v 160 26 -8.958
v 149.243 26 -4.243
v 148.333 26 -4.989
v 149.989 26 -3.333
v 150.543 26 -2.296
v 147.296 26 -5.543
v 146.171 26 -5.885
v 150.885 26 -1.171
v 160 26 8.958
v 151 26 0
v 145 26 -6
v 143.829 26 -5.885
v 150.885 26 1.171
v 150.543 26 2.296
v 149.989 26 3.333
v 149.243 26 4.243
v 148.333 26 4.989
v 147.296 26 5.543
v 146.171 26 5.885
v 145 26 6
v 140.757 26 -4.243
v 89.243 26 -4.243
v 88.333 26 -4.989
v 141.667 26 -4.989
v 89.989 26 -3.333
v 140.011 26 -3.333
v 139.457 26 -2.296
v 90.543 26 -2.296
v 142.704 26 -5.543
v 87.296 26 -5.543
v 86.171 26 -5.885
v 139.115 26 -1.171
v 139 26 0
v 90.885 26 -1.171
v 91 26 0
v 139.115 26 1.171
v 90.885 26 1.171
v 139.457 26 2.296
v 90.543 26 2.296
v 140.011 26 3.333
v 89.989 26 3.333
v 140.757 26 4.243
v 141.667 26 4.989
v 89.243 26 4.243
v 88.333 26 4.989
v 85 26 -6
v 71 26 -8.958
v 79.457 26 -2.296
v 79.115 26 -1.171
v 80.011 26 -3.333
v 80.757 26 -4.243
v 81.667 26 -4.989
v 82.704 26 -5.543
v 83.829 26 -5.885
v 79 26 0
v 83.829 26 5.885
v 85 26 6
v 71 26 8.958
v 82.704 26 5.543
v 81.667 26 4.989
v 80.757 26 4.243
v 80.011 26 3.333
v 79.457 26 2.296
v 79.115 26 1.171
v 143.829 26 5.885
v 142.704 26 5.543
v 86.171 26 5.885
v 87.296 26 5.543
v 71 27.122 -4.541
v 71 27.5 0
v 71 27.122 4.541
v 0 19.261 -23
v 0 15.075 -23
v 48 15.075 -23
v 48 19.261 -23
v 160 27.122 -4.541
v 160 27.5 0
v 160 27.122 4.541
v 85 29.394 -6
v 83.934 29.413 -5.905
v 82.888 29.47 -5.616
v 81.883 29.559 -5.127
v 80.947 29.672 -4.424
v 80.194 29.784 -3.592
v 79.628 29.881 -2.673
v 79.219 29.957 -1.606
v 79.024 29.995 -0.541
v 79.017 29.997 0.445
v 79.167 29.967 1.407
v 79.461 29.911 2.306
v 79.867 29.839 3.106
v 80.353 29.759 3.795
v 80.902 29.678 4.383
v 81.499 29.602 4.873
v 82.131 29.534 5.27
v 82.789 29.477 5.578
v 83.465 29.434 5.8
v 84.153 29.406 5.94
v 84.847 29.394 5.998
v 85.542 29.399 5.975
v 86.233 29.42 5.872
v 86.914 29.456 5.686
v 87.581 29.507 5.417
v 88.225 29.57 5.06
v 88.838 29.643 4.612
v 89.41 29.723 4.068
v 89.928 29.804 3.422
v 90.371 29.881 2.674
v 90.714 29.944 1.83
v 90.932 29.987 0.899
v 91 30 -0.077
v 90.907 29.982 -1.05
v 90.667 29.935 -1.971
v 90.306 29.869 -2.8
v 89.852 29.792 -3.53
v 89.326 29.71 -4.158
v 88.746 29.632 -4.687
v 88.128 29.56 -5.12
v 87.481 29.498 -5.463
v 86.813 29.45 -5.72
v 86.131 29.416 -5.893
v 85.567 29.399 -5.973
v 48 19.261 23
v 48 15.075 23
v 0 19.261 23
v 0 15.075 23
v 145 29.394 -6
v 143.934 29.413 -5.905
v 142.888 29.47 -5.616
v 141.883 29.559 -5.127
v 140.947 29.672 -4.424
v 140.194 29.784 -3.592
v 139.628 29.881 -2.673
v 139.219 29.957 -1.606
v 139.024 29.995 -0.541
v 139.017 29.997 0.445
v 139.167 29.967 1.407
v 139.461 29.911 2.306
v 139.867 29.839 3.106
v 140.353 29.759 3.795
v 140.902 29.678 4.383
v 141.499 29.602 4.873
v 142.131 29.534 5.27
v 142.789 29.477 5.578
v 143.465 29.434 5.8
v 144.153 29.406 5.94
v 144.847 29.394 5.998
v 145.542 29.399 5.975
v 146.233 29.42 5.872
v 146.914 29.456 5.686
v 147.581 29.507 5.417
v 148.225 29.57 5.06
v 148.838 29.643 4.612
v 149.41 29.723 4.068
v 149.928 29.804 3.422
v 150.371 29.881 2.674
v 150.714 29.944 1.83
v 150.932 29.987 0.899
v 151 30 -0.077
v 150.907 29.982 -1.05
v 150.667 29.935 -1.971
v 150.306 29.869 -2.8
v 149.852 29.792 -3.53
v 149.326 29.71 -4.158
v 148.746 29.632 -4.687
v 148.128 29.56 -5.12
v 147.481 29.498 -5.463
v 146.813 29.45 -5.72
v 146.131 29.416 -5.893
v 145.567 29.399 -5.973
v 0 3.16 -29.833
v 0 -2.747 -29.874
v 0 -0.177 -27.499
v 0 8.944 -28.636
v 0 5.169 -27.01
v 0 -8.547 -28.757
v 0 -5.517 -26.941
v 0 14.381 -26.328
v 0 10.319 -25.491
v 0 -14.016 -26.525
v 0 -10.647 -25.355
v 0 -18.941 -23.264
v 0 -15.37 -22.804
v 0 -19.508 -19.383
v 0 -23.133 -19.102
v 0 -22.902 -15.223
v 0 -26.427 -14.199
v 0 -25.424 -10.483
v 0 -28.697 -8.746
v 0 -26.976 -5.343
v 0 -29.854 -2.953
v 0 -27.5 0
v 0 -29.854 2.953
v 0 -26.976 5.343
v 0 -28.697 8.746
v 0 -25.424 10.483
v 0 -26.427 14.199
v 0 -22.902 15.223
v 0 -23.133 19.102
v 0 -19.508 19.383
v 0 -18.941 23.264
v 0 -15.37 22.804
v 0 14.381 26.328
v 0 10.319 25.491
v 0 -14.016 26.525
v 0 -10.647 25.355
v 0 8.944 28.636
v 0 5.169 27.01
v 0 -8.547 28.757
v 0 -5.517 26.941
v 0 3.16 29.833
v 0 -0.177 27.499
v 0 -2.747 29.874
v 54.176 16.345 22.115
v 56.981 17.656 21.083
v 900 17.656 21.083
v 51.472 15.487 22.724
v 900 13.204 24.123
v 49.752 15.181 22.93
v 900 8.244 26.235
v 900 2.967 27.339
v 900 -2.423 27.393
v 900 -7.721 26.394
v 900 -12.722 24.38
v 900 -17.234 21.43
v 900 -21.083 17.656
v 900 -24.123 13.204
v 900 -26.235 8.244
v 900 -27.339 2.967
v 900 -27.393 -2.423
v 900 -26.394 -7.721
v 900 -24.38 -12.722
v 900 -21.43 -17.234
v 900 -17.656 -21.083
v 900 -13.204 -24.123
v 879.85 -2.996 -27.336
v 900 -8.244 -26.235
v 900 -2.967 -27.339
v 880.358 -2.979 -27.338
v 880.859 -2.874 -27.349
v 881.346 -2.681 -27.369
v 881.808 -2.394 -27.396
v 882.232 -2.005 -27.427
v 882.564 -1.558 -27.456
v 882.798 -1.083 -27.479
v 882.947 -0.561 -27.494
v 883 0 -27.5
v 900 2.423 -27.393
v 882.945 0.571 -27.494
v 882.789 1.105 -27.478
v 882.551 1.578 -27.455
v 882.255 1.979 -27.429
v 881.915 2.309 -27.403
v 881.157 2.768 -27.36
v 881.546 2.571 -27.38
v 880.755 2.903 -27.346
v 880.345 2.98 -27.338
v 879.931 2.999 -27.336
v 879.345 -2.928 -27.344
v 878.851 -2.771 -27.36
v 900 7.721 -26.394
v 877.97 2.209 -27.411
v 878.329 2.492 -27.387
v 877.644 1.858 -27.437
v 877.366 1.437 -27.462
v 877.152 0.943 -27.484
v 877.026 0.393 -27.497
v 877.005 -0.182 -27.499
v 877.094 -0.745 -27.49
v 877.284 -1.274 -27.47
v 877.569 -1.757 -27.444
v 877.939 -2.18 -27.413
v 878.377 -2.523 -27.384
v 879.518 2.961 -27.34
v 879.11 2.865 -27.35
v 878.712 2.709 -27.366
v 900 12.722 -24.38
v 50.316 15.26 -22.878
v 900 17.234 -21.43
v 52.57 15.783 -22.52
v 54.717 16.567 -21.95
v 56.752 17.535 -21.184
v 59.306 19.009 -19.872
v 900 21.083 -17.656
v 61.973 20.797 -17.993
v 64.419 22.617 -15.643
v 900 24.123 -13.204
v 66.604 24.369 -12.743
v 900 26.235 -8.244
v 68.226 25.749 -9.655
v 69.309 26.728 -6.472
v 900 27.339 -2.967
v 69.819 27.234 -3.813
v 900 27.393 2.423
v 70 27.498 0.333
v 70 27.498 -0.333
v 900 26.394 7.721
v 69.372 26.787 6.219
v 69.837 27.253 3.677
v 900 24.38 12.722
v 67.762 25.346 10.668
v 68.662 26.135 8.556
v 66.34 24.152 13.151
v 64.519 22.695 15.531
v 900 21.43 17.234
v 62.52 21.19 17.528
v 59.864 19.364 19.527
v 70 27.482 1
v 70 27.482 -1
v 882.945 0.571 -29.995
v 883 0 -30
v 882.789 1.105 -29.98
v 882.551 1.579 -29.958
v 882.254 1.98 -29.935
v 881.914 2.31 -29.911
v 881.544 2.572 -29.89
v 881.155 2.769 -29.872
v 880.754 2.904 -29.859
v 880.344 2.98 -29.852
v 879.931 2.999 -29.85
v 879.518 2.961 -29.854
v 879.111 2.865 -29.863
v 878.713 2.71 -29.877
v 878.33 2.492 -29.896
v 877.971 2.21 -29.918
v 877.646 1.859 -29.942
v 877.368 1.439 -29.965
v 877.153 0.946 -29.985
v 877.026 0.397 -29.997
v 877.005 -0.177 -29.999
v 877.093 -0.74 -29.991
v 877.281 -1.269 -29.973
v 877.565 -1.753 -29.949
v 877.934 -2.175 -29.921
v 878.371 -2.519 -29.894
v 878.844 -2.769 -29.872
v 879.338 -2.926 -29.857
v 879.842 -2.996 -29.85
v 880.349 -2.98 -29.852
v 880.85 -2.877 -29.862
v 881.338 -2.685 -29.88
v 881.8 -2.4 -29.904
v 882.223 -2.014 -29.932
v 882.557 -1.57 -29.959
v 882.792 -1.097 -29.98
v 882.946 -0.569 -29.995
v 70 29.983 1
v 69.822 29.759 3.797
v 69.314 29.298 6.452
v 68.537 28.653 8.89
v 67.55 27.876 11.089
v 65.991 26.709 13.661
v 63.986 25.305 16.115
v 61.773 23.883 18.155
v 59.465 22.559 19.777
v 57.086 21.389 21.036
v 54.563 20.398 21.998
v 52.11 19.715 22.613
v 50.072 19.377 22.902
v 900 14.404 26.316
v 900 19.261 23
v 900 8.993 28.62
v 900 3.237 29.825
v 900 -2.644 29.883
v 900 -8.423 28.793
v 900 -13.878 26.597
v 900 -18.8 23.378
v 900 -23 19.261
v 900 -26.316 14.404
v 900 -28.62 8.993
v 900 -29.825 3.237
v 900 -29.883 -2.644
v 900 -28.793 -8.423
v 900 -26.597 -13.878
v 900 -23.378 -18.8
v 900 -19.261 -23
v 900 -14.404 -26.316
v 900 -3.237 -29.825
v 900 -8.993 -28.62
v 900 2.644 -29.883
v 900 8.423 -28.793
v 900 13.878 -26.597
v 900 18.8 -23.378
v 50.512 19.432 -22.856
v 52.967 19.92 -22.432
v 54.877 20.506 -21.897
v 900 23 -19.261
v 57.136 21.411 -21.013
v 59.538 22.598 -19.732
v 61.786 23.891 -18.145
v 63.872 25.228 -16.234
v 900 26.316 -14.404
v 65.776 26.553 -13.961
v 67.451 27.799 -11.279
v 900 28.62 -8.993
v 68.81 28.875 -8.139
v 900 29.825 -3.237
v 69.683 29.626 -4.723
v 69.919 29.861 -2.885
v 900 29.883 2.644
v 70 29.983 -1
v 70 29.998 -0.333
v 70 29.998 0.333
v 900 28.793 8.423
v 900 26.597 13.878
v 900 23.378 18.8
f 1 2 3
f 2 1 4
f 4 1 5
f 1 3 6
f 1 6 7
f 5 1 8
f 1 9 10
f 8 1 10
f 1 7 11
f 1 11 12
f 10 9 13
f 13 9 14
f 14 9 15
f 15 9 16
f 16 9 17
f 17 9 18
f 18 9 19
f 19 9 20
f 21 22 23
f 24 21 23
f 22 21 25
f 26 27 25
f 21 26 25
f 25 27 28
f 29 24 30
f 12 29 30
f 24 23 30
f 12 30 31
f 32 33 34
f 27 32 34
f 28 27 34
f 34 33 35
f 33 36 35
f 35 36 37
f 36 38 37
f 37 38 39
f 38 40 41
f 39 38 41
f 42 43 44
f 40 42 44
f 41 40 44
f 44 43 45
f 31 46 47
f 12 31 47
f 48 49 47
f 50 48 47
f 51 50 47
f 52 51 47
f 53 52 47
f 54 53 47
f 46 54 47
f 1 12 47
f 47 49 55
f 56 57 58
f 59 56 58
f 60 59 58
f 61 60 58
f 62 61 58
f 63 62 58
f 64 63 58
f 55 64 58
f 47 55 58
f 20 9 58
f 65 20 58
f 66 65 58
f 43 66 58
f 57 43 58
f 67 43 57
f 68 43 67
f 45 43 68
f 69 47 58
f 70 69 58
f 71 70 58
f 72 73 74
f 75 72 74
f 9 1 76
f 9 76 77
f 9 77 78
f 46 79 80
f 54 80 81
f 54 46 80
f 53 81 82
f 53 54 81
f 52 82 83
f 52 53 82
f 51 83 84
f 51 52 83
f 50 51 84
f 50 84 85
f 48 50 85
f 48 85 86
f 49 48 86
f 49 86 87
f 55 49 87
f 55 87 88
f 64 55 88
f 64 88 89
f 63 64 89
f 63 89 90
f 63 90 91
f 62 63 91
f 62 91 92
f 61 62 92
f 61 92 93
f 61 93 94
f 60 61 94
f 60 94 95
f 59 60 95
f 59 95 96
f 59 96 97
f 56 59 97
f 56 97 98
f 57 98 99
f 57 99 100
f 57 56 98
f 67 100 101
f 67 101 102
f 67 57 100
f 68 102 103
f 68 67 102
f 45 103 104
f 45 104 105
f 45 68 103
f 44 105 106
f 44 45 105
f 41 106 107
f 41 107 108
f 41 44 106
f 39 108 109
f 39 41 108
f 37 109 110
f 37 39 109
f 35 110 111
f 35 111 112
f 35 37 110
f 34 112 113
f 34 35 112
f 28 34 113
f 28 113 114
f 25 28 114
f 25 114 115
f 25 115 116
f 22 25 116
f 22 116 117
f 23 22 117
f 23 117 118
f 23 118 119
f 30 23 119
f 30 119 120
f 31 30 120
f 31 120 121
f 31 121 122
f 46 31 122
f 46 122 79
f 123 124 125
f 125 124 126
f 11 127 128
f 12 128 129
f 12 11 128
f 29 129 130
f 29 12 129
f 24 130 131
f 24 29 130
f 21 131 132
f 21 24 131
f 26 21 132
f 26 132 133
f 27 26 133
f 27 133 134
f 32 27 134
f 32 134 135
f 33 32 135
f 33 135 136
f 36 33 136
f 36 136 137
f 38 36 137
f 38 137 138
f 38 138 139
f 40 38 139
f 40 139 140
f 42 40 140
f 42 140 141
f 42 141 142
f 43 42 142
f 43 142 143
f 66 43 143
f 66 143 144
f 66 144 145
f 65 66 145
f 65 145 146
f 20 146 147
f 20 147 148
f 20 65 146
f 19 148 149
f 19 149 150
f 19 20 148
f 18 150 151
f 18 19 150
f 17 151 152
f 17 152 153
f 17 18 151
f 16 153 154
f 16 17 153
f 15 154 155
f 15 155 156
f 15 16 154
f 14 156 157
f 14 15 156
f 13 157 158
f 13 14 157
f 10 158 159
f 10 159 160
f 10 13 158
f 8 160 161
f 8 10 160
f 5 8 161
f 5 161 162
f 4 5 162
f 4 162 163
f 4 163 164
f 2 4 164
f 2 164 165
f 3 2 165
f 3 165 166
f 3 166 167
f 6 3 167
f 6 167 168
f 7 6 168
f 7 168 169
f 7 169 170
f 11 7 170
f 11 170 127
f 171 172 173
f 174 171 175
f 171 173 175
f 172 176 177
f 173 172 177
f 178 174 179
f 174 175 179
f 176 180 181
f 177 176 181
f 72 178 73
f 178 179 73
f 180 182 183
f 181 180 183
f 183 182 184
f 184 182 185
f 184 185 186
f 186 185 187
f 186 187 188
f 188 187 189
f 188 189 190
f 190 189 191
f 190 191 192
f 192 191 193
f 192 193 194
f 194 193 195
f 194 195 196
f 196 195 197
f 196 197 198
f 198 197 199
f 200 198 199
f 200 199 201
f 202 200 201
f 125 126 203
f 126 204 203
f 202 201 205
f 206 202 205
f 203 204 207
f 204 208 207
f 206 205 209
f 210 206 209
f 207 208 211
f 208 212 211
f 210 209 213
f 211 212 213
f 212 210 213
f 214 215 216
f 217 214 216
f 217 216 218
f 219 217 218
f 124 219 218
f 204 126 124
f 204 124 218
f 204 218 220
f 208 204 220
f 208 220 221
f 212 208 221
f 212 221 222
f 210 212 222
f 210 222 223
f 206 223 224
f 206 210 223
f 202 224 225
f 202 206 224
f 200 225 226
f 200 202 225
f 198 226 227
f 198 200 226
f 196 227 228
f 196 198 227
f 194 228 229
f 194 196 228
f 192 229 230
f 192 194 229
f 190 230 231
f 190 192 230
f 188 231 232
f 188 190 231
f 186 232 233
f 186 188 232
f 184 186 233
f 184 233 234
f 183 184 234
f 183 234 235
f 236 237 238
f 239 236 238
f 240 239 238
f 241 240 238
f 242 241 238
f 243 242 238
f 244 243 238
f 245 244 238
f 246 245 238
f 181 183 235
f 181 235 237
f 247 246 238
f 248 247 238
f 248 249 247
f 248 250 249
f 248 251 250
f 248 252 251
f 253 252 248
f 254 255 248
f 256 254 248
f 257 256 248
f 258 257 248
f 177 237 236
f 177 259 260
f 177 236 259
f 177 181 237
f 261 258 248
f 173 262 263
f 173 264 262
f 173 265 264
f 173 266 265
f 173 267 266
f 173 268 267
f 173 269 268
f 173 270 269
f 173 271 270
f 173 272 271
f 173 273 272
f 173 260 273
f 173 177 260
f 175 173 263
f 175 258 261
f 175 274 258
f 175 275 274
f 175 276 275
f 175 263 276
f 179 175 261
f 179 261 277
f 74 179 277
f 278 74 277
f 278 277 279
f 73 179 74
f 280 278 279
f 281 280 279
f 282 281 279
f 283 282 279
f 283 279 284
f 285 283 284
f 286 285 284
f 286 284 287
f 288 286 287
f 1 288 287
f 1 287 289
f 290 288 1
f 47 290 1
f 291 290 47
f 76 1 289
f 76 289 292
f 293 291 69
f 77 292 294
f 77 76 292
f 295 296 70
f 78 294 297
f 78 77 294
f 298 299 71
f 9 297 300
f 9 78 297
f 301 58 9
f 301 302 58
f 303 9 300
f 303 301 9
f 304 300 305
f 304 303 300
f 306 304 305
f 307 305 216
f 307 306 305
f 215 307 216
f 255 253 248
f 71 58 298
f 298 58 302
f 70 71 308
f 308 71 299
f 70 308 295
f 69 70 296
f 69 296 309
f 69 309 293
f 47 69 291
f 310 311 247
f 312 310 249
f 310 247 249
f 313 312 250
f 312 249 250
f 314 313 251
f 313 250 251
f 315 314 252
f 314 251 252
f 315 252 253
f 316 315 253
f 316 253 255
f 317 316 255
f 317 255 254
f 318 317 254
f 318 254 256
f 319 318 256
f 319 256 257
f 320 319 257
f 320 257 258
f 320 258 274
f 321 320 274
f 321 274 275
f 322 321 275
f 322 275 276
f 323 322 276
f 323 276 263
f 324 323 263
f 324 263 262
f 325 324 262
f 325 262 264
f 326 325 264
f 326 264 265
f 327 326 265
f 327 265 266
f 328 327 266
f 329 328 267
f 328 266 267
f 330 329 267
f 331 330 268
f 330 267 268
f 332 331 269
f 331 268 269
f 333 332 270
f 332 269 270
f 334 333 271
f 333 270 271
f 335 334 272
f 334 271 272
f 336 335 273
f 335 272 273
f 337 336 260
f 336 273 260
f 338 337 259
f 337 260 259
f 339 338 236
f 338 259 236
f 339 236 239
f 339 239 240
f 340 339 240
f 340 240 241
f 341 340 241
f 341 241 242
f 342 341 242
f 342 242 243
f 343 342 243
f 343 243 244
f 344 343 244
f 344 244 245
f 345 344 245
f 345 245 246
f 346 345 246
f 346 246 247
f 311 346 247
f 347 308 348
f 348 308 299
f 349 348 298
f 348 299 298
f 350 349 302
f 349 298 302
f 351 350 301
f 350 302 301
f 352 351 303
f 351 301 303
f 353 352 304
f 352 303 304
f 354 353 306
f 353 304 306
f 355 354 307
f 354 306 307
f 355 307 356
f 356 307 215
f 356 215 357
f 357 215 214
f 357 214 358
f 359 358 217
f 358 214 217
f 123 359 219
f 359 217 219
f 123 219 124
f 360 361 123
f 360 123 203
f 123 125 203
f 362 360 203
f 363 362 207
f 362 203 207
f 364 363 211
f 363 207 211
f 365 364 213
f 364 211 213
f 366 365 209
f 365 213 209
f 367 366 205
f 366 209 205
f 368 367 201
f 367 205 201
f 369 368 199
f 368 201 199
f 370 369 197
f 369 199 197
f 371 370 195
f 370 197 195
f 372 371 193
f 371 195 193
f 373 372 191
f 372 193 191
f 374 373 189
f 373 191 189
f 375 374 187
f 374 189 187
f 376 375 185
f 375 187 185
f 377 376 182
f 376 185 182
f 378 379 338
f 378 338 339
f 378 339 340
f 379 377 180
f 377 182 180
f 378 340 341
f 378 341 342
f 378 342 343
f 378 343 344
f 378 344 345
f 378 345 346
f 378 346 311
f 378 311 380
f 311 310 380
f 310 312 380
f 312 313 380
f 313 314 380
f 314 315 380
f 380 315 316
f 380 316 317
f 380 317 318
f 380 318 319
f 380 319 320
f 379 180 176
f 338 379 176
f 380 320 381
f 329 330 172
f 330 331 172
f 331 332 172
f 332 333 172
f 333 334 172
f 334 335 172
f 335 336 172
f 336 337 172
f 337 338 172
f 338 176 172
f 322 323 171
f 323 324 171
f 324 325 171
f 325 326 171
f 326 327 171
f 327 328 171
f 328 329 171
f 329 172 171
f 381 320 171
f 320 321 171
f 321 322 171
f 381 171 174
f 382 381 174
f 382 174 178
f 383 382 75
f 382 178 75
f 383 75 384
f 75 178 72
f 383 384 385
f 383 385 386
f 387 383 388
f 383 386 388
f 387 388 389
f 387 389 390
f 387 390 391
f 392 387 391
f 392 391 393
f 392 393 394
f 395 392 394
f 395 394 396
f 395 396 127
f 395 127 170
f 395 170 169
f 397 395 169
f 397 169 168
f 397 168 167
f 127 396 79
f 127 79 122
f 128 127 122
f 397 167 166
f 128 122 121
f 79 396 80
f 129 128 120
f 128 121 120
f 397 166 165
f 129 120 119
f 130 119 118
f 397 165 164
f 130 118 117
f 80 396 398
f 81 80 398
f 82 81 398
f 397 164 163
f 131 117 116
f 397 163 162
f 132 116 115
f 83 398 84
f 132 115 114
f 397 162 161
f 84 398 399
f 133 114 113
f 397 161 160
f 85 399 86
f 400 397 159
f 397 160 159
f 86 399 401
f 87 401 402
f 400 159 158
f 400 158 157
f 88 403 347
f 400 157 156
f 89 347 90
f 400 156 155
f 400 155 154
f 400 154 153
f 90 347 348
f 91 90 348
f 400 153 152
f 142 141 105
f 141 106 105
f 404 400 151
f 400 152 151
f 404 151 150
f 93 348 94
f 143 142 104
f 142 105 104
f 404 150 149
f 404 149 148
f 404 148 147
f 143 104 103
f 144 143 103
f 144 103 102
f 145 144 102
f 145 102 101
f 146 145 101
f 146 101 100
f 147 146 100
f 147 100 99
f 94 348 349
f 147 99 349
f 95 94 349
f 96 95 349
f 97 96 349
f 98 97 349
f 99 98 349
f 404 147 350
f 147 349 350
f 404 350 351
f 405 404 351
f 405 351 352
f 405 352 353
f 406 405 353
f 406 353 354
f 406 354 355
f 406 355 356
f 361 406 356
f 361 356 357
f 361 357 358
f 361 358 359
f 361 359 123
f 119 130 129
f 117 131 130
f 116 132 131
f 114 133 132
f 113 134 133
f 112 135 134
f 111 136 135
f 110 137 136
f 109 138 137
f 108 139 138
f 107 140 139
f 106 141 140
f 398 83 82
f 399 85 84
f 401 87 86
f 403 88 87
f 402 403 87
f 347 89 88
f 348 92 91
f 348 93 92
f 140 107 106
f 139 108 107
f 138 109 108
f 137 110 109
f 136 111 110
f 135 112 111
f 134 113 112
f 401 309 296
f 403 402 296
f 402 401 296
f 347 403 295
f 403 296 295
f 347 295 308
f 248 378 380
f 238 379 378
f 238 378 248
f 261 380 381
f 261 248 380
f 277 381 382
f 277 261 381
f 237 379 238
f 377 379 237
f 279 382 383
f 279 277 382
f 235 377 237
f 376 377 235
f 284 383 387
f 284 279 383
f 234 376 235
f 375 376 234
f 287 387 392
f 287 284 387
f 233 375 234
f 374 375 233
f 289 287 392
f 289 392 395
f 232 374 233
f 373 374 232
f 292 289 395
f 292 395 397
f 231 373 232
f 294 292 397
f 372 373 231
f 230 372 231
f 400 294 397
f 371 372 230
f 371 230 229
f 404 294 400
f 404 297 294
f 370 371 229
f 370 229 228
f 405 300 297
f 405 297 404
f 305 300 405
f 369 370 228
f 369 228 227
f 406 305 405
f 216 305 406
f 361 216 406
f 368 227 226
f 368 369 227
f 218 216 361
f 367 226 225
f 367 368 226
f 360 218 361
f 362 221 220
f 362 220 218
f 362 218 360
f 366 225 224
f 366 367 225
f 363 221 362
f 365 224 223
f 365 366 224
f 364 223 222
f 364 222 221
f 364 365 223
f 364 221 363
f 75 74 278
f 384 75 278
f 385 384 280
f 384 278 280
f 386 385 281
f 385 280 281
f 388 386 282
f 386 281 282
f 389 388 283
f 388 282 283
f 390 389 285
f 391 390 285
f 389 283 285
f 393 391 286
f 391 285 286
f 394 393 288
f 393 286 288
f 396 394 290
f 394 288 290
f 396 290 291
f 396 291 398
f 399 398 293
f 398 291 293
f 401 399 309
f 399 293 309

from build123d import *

# Parameters (mm, degrees)
ESQUISSE1_R             = 30
BASE_EXTRUSION_DEPTH    = 900
COQUE1_T                = -2.5
ENL_V_MAT_EXTRU_1_DEPTH = 100
ESQUISSE4_W             = 89
ESQUISSE4_H             = 20
BOSS_EXTRU_1_DEPTH      = 2
ESQUISSE3_R             = 6
ENL_V_MAT_EXTRU_2_DEPTH = 100
ESQUISSE6_R             = 3
ENL_V_MAT_EXTRU_3_DEPTH = 50


with BuildPart() as part:
    # Esquisse1 → Base-Extrusion (new body)
    with BuildSketch(Plane(origin=(0, 0, 0), x_dir=(0, 0, -1), z_dir=(1, 0, 0))):
        with Locations(Location((0, 0, 0), (0, 0, 140.05549481))):
            Circle(ESQUISSE1_R)
    extrude(amount=BASE_EXTRUSION_DEPTH)

    # Coque1
    coque1_openings = [part.faces().sort_by_distance(p)[0] for p in [
        (0, 0, 0),
        (900, 0, 0),
    ]]
    offset(amount=COQUE1_T, openings=coque1_openings, kind=Kind.INTERSECTION)

    # Esquisse2 → Enlèv. mat.-Extru.1 (cut)
    with BuildSketch(Plane(origin=(0, 0, 0), x_dir=(1, 0, 0), z_dir=(0, 1, 0))):
        with BuildLine():
            Line((-10, 23), (48, 23))
            ThreePointArc((48, 23), (63.556349186, 16.556349186), (70, 1))
            Line((70, 1), (70, -1))
            ThreePointArc((70, -1), (63.556349186, -16.556349186), (48, -23))
            Line((48, -23), (-10, -23))
            Line((-10, -23), (-10, 23))
        make_face()
    extrude(amount=ENL_V_MAT_EXTRU_1_DEPTH, mode=Mode.SUBTRACT)

    # Esquisse4 → Boss.-Extru.1 (add)
    with BuildSketch(Plane(origin=(0, 26, 0), x_dir=(-1, 0, 0), z_dir=(0, 1, 0))):
        with Locations((-115.5, 0)):
            Rectangle(ESQUISSE4_W, ESQUISSE4_H)
    extrude(amount=BOSS_EXTRU_1_DEPTH)

    # Esquisse3 → Enlèv. mat.-Extru.2 (cut)
    with BuildSketch(Plane(origin=(0, 0, 0), x_dir=(1, 0, 0), z_dir=(0, 1, 0))):
        with Locations(Location((85, 0, 0), (0, 0, 90))):
            Circle(ESQUISSE3_R)
        with Locations(Location((145, 0, 0), (0, 0, 90))):
            Circle(ESQUISSE3_R)
    extrude(amount=ENL_V_MAT_EXTRU_2_DEPTH, mode=Mode.SUBTRACT)

    # Esquisse6 → Enlèv. mat.-Extru.3 (cut)
    with BuildSketch(Plane.XY):
        with Locations((880, 0)):
            Circle(ESQUISSE6_R)
    extrude(amount=-ENL_V_MAT_EXTRU_3_DEPTH, mode=Mode.SUBTRACT)


solid = part.part
